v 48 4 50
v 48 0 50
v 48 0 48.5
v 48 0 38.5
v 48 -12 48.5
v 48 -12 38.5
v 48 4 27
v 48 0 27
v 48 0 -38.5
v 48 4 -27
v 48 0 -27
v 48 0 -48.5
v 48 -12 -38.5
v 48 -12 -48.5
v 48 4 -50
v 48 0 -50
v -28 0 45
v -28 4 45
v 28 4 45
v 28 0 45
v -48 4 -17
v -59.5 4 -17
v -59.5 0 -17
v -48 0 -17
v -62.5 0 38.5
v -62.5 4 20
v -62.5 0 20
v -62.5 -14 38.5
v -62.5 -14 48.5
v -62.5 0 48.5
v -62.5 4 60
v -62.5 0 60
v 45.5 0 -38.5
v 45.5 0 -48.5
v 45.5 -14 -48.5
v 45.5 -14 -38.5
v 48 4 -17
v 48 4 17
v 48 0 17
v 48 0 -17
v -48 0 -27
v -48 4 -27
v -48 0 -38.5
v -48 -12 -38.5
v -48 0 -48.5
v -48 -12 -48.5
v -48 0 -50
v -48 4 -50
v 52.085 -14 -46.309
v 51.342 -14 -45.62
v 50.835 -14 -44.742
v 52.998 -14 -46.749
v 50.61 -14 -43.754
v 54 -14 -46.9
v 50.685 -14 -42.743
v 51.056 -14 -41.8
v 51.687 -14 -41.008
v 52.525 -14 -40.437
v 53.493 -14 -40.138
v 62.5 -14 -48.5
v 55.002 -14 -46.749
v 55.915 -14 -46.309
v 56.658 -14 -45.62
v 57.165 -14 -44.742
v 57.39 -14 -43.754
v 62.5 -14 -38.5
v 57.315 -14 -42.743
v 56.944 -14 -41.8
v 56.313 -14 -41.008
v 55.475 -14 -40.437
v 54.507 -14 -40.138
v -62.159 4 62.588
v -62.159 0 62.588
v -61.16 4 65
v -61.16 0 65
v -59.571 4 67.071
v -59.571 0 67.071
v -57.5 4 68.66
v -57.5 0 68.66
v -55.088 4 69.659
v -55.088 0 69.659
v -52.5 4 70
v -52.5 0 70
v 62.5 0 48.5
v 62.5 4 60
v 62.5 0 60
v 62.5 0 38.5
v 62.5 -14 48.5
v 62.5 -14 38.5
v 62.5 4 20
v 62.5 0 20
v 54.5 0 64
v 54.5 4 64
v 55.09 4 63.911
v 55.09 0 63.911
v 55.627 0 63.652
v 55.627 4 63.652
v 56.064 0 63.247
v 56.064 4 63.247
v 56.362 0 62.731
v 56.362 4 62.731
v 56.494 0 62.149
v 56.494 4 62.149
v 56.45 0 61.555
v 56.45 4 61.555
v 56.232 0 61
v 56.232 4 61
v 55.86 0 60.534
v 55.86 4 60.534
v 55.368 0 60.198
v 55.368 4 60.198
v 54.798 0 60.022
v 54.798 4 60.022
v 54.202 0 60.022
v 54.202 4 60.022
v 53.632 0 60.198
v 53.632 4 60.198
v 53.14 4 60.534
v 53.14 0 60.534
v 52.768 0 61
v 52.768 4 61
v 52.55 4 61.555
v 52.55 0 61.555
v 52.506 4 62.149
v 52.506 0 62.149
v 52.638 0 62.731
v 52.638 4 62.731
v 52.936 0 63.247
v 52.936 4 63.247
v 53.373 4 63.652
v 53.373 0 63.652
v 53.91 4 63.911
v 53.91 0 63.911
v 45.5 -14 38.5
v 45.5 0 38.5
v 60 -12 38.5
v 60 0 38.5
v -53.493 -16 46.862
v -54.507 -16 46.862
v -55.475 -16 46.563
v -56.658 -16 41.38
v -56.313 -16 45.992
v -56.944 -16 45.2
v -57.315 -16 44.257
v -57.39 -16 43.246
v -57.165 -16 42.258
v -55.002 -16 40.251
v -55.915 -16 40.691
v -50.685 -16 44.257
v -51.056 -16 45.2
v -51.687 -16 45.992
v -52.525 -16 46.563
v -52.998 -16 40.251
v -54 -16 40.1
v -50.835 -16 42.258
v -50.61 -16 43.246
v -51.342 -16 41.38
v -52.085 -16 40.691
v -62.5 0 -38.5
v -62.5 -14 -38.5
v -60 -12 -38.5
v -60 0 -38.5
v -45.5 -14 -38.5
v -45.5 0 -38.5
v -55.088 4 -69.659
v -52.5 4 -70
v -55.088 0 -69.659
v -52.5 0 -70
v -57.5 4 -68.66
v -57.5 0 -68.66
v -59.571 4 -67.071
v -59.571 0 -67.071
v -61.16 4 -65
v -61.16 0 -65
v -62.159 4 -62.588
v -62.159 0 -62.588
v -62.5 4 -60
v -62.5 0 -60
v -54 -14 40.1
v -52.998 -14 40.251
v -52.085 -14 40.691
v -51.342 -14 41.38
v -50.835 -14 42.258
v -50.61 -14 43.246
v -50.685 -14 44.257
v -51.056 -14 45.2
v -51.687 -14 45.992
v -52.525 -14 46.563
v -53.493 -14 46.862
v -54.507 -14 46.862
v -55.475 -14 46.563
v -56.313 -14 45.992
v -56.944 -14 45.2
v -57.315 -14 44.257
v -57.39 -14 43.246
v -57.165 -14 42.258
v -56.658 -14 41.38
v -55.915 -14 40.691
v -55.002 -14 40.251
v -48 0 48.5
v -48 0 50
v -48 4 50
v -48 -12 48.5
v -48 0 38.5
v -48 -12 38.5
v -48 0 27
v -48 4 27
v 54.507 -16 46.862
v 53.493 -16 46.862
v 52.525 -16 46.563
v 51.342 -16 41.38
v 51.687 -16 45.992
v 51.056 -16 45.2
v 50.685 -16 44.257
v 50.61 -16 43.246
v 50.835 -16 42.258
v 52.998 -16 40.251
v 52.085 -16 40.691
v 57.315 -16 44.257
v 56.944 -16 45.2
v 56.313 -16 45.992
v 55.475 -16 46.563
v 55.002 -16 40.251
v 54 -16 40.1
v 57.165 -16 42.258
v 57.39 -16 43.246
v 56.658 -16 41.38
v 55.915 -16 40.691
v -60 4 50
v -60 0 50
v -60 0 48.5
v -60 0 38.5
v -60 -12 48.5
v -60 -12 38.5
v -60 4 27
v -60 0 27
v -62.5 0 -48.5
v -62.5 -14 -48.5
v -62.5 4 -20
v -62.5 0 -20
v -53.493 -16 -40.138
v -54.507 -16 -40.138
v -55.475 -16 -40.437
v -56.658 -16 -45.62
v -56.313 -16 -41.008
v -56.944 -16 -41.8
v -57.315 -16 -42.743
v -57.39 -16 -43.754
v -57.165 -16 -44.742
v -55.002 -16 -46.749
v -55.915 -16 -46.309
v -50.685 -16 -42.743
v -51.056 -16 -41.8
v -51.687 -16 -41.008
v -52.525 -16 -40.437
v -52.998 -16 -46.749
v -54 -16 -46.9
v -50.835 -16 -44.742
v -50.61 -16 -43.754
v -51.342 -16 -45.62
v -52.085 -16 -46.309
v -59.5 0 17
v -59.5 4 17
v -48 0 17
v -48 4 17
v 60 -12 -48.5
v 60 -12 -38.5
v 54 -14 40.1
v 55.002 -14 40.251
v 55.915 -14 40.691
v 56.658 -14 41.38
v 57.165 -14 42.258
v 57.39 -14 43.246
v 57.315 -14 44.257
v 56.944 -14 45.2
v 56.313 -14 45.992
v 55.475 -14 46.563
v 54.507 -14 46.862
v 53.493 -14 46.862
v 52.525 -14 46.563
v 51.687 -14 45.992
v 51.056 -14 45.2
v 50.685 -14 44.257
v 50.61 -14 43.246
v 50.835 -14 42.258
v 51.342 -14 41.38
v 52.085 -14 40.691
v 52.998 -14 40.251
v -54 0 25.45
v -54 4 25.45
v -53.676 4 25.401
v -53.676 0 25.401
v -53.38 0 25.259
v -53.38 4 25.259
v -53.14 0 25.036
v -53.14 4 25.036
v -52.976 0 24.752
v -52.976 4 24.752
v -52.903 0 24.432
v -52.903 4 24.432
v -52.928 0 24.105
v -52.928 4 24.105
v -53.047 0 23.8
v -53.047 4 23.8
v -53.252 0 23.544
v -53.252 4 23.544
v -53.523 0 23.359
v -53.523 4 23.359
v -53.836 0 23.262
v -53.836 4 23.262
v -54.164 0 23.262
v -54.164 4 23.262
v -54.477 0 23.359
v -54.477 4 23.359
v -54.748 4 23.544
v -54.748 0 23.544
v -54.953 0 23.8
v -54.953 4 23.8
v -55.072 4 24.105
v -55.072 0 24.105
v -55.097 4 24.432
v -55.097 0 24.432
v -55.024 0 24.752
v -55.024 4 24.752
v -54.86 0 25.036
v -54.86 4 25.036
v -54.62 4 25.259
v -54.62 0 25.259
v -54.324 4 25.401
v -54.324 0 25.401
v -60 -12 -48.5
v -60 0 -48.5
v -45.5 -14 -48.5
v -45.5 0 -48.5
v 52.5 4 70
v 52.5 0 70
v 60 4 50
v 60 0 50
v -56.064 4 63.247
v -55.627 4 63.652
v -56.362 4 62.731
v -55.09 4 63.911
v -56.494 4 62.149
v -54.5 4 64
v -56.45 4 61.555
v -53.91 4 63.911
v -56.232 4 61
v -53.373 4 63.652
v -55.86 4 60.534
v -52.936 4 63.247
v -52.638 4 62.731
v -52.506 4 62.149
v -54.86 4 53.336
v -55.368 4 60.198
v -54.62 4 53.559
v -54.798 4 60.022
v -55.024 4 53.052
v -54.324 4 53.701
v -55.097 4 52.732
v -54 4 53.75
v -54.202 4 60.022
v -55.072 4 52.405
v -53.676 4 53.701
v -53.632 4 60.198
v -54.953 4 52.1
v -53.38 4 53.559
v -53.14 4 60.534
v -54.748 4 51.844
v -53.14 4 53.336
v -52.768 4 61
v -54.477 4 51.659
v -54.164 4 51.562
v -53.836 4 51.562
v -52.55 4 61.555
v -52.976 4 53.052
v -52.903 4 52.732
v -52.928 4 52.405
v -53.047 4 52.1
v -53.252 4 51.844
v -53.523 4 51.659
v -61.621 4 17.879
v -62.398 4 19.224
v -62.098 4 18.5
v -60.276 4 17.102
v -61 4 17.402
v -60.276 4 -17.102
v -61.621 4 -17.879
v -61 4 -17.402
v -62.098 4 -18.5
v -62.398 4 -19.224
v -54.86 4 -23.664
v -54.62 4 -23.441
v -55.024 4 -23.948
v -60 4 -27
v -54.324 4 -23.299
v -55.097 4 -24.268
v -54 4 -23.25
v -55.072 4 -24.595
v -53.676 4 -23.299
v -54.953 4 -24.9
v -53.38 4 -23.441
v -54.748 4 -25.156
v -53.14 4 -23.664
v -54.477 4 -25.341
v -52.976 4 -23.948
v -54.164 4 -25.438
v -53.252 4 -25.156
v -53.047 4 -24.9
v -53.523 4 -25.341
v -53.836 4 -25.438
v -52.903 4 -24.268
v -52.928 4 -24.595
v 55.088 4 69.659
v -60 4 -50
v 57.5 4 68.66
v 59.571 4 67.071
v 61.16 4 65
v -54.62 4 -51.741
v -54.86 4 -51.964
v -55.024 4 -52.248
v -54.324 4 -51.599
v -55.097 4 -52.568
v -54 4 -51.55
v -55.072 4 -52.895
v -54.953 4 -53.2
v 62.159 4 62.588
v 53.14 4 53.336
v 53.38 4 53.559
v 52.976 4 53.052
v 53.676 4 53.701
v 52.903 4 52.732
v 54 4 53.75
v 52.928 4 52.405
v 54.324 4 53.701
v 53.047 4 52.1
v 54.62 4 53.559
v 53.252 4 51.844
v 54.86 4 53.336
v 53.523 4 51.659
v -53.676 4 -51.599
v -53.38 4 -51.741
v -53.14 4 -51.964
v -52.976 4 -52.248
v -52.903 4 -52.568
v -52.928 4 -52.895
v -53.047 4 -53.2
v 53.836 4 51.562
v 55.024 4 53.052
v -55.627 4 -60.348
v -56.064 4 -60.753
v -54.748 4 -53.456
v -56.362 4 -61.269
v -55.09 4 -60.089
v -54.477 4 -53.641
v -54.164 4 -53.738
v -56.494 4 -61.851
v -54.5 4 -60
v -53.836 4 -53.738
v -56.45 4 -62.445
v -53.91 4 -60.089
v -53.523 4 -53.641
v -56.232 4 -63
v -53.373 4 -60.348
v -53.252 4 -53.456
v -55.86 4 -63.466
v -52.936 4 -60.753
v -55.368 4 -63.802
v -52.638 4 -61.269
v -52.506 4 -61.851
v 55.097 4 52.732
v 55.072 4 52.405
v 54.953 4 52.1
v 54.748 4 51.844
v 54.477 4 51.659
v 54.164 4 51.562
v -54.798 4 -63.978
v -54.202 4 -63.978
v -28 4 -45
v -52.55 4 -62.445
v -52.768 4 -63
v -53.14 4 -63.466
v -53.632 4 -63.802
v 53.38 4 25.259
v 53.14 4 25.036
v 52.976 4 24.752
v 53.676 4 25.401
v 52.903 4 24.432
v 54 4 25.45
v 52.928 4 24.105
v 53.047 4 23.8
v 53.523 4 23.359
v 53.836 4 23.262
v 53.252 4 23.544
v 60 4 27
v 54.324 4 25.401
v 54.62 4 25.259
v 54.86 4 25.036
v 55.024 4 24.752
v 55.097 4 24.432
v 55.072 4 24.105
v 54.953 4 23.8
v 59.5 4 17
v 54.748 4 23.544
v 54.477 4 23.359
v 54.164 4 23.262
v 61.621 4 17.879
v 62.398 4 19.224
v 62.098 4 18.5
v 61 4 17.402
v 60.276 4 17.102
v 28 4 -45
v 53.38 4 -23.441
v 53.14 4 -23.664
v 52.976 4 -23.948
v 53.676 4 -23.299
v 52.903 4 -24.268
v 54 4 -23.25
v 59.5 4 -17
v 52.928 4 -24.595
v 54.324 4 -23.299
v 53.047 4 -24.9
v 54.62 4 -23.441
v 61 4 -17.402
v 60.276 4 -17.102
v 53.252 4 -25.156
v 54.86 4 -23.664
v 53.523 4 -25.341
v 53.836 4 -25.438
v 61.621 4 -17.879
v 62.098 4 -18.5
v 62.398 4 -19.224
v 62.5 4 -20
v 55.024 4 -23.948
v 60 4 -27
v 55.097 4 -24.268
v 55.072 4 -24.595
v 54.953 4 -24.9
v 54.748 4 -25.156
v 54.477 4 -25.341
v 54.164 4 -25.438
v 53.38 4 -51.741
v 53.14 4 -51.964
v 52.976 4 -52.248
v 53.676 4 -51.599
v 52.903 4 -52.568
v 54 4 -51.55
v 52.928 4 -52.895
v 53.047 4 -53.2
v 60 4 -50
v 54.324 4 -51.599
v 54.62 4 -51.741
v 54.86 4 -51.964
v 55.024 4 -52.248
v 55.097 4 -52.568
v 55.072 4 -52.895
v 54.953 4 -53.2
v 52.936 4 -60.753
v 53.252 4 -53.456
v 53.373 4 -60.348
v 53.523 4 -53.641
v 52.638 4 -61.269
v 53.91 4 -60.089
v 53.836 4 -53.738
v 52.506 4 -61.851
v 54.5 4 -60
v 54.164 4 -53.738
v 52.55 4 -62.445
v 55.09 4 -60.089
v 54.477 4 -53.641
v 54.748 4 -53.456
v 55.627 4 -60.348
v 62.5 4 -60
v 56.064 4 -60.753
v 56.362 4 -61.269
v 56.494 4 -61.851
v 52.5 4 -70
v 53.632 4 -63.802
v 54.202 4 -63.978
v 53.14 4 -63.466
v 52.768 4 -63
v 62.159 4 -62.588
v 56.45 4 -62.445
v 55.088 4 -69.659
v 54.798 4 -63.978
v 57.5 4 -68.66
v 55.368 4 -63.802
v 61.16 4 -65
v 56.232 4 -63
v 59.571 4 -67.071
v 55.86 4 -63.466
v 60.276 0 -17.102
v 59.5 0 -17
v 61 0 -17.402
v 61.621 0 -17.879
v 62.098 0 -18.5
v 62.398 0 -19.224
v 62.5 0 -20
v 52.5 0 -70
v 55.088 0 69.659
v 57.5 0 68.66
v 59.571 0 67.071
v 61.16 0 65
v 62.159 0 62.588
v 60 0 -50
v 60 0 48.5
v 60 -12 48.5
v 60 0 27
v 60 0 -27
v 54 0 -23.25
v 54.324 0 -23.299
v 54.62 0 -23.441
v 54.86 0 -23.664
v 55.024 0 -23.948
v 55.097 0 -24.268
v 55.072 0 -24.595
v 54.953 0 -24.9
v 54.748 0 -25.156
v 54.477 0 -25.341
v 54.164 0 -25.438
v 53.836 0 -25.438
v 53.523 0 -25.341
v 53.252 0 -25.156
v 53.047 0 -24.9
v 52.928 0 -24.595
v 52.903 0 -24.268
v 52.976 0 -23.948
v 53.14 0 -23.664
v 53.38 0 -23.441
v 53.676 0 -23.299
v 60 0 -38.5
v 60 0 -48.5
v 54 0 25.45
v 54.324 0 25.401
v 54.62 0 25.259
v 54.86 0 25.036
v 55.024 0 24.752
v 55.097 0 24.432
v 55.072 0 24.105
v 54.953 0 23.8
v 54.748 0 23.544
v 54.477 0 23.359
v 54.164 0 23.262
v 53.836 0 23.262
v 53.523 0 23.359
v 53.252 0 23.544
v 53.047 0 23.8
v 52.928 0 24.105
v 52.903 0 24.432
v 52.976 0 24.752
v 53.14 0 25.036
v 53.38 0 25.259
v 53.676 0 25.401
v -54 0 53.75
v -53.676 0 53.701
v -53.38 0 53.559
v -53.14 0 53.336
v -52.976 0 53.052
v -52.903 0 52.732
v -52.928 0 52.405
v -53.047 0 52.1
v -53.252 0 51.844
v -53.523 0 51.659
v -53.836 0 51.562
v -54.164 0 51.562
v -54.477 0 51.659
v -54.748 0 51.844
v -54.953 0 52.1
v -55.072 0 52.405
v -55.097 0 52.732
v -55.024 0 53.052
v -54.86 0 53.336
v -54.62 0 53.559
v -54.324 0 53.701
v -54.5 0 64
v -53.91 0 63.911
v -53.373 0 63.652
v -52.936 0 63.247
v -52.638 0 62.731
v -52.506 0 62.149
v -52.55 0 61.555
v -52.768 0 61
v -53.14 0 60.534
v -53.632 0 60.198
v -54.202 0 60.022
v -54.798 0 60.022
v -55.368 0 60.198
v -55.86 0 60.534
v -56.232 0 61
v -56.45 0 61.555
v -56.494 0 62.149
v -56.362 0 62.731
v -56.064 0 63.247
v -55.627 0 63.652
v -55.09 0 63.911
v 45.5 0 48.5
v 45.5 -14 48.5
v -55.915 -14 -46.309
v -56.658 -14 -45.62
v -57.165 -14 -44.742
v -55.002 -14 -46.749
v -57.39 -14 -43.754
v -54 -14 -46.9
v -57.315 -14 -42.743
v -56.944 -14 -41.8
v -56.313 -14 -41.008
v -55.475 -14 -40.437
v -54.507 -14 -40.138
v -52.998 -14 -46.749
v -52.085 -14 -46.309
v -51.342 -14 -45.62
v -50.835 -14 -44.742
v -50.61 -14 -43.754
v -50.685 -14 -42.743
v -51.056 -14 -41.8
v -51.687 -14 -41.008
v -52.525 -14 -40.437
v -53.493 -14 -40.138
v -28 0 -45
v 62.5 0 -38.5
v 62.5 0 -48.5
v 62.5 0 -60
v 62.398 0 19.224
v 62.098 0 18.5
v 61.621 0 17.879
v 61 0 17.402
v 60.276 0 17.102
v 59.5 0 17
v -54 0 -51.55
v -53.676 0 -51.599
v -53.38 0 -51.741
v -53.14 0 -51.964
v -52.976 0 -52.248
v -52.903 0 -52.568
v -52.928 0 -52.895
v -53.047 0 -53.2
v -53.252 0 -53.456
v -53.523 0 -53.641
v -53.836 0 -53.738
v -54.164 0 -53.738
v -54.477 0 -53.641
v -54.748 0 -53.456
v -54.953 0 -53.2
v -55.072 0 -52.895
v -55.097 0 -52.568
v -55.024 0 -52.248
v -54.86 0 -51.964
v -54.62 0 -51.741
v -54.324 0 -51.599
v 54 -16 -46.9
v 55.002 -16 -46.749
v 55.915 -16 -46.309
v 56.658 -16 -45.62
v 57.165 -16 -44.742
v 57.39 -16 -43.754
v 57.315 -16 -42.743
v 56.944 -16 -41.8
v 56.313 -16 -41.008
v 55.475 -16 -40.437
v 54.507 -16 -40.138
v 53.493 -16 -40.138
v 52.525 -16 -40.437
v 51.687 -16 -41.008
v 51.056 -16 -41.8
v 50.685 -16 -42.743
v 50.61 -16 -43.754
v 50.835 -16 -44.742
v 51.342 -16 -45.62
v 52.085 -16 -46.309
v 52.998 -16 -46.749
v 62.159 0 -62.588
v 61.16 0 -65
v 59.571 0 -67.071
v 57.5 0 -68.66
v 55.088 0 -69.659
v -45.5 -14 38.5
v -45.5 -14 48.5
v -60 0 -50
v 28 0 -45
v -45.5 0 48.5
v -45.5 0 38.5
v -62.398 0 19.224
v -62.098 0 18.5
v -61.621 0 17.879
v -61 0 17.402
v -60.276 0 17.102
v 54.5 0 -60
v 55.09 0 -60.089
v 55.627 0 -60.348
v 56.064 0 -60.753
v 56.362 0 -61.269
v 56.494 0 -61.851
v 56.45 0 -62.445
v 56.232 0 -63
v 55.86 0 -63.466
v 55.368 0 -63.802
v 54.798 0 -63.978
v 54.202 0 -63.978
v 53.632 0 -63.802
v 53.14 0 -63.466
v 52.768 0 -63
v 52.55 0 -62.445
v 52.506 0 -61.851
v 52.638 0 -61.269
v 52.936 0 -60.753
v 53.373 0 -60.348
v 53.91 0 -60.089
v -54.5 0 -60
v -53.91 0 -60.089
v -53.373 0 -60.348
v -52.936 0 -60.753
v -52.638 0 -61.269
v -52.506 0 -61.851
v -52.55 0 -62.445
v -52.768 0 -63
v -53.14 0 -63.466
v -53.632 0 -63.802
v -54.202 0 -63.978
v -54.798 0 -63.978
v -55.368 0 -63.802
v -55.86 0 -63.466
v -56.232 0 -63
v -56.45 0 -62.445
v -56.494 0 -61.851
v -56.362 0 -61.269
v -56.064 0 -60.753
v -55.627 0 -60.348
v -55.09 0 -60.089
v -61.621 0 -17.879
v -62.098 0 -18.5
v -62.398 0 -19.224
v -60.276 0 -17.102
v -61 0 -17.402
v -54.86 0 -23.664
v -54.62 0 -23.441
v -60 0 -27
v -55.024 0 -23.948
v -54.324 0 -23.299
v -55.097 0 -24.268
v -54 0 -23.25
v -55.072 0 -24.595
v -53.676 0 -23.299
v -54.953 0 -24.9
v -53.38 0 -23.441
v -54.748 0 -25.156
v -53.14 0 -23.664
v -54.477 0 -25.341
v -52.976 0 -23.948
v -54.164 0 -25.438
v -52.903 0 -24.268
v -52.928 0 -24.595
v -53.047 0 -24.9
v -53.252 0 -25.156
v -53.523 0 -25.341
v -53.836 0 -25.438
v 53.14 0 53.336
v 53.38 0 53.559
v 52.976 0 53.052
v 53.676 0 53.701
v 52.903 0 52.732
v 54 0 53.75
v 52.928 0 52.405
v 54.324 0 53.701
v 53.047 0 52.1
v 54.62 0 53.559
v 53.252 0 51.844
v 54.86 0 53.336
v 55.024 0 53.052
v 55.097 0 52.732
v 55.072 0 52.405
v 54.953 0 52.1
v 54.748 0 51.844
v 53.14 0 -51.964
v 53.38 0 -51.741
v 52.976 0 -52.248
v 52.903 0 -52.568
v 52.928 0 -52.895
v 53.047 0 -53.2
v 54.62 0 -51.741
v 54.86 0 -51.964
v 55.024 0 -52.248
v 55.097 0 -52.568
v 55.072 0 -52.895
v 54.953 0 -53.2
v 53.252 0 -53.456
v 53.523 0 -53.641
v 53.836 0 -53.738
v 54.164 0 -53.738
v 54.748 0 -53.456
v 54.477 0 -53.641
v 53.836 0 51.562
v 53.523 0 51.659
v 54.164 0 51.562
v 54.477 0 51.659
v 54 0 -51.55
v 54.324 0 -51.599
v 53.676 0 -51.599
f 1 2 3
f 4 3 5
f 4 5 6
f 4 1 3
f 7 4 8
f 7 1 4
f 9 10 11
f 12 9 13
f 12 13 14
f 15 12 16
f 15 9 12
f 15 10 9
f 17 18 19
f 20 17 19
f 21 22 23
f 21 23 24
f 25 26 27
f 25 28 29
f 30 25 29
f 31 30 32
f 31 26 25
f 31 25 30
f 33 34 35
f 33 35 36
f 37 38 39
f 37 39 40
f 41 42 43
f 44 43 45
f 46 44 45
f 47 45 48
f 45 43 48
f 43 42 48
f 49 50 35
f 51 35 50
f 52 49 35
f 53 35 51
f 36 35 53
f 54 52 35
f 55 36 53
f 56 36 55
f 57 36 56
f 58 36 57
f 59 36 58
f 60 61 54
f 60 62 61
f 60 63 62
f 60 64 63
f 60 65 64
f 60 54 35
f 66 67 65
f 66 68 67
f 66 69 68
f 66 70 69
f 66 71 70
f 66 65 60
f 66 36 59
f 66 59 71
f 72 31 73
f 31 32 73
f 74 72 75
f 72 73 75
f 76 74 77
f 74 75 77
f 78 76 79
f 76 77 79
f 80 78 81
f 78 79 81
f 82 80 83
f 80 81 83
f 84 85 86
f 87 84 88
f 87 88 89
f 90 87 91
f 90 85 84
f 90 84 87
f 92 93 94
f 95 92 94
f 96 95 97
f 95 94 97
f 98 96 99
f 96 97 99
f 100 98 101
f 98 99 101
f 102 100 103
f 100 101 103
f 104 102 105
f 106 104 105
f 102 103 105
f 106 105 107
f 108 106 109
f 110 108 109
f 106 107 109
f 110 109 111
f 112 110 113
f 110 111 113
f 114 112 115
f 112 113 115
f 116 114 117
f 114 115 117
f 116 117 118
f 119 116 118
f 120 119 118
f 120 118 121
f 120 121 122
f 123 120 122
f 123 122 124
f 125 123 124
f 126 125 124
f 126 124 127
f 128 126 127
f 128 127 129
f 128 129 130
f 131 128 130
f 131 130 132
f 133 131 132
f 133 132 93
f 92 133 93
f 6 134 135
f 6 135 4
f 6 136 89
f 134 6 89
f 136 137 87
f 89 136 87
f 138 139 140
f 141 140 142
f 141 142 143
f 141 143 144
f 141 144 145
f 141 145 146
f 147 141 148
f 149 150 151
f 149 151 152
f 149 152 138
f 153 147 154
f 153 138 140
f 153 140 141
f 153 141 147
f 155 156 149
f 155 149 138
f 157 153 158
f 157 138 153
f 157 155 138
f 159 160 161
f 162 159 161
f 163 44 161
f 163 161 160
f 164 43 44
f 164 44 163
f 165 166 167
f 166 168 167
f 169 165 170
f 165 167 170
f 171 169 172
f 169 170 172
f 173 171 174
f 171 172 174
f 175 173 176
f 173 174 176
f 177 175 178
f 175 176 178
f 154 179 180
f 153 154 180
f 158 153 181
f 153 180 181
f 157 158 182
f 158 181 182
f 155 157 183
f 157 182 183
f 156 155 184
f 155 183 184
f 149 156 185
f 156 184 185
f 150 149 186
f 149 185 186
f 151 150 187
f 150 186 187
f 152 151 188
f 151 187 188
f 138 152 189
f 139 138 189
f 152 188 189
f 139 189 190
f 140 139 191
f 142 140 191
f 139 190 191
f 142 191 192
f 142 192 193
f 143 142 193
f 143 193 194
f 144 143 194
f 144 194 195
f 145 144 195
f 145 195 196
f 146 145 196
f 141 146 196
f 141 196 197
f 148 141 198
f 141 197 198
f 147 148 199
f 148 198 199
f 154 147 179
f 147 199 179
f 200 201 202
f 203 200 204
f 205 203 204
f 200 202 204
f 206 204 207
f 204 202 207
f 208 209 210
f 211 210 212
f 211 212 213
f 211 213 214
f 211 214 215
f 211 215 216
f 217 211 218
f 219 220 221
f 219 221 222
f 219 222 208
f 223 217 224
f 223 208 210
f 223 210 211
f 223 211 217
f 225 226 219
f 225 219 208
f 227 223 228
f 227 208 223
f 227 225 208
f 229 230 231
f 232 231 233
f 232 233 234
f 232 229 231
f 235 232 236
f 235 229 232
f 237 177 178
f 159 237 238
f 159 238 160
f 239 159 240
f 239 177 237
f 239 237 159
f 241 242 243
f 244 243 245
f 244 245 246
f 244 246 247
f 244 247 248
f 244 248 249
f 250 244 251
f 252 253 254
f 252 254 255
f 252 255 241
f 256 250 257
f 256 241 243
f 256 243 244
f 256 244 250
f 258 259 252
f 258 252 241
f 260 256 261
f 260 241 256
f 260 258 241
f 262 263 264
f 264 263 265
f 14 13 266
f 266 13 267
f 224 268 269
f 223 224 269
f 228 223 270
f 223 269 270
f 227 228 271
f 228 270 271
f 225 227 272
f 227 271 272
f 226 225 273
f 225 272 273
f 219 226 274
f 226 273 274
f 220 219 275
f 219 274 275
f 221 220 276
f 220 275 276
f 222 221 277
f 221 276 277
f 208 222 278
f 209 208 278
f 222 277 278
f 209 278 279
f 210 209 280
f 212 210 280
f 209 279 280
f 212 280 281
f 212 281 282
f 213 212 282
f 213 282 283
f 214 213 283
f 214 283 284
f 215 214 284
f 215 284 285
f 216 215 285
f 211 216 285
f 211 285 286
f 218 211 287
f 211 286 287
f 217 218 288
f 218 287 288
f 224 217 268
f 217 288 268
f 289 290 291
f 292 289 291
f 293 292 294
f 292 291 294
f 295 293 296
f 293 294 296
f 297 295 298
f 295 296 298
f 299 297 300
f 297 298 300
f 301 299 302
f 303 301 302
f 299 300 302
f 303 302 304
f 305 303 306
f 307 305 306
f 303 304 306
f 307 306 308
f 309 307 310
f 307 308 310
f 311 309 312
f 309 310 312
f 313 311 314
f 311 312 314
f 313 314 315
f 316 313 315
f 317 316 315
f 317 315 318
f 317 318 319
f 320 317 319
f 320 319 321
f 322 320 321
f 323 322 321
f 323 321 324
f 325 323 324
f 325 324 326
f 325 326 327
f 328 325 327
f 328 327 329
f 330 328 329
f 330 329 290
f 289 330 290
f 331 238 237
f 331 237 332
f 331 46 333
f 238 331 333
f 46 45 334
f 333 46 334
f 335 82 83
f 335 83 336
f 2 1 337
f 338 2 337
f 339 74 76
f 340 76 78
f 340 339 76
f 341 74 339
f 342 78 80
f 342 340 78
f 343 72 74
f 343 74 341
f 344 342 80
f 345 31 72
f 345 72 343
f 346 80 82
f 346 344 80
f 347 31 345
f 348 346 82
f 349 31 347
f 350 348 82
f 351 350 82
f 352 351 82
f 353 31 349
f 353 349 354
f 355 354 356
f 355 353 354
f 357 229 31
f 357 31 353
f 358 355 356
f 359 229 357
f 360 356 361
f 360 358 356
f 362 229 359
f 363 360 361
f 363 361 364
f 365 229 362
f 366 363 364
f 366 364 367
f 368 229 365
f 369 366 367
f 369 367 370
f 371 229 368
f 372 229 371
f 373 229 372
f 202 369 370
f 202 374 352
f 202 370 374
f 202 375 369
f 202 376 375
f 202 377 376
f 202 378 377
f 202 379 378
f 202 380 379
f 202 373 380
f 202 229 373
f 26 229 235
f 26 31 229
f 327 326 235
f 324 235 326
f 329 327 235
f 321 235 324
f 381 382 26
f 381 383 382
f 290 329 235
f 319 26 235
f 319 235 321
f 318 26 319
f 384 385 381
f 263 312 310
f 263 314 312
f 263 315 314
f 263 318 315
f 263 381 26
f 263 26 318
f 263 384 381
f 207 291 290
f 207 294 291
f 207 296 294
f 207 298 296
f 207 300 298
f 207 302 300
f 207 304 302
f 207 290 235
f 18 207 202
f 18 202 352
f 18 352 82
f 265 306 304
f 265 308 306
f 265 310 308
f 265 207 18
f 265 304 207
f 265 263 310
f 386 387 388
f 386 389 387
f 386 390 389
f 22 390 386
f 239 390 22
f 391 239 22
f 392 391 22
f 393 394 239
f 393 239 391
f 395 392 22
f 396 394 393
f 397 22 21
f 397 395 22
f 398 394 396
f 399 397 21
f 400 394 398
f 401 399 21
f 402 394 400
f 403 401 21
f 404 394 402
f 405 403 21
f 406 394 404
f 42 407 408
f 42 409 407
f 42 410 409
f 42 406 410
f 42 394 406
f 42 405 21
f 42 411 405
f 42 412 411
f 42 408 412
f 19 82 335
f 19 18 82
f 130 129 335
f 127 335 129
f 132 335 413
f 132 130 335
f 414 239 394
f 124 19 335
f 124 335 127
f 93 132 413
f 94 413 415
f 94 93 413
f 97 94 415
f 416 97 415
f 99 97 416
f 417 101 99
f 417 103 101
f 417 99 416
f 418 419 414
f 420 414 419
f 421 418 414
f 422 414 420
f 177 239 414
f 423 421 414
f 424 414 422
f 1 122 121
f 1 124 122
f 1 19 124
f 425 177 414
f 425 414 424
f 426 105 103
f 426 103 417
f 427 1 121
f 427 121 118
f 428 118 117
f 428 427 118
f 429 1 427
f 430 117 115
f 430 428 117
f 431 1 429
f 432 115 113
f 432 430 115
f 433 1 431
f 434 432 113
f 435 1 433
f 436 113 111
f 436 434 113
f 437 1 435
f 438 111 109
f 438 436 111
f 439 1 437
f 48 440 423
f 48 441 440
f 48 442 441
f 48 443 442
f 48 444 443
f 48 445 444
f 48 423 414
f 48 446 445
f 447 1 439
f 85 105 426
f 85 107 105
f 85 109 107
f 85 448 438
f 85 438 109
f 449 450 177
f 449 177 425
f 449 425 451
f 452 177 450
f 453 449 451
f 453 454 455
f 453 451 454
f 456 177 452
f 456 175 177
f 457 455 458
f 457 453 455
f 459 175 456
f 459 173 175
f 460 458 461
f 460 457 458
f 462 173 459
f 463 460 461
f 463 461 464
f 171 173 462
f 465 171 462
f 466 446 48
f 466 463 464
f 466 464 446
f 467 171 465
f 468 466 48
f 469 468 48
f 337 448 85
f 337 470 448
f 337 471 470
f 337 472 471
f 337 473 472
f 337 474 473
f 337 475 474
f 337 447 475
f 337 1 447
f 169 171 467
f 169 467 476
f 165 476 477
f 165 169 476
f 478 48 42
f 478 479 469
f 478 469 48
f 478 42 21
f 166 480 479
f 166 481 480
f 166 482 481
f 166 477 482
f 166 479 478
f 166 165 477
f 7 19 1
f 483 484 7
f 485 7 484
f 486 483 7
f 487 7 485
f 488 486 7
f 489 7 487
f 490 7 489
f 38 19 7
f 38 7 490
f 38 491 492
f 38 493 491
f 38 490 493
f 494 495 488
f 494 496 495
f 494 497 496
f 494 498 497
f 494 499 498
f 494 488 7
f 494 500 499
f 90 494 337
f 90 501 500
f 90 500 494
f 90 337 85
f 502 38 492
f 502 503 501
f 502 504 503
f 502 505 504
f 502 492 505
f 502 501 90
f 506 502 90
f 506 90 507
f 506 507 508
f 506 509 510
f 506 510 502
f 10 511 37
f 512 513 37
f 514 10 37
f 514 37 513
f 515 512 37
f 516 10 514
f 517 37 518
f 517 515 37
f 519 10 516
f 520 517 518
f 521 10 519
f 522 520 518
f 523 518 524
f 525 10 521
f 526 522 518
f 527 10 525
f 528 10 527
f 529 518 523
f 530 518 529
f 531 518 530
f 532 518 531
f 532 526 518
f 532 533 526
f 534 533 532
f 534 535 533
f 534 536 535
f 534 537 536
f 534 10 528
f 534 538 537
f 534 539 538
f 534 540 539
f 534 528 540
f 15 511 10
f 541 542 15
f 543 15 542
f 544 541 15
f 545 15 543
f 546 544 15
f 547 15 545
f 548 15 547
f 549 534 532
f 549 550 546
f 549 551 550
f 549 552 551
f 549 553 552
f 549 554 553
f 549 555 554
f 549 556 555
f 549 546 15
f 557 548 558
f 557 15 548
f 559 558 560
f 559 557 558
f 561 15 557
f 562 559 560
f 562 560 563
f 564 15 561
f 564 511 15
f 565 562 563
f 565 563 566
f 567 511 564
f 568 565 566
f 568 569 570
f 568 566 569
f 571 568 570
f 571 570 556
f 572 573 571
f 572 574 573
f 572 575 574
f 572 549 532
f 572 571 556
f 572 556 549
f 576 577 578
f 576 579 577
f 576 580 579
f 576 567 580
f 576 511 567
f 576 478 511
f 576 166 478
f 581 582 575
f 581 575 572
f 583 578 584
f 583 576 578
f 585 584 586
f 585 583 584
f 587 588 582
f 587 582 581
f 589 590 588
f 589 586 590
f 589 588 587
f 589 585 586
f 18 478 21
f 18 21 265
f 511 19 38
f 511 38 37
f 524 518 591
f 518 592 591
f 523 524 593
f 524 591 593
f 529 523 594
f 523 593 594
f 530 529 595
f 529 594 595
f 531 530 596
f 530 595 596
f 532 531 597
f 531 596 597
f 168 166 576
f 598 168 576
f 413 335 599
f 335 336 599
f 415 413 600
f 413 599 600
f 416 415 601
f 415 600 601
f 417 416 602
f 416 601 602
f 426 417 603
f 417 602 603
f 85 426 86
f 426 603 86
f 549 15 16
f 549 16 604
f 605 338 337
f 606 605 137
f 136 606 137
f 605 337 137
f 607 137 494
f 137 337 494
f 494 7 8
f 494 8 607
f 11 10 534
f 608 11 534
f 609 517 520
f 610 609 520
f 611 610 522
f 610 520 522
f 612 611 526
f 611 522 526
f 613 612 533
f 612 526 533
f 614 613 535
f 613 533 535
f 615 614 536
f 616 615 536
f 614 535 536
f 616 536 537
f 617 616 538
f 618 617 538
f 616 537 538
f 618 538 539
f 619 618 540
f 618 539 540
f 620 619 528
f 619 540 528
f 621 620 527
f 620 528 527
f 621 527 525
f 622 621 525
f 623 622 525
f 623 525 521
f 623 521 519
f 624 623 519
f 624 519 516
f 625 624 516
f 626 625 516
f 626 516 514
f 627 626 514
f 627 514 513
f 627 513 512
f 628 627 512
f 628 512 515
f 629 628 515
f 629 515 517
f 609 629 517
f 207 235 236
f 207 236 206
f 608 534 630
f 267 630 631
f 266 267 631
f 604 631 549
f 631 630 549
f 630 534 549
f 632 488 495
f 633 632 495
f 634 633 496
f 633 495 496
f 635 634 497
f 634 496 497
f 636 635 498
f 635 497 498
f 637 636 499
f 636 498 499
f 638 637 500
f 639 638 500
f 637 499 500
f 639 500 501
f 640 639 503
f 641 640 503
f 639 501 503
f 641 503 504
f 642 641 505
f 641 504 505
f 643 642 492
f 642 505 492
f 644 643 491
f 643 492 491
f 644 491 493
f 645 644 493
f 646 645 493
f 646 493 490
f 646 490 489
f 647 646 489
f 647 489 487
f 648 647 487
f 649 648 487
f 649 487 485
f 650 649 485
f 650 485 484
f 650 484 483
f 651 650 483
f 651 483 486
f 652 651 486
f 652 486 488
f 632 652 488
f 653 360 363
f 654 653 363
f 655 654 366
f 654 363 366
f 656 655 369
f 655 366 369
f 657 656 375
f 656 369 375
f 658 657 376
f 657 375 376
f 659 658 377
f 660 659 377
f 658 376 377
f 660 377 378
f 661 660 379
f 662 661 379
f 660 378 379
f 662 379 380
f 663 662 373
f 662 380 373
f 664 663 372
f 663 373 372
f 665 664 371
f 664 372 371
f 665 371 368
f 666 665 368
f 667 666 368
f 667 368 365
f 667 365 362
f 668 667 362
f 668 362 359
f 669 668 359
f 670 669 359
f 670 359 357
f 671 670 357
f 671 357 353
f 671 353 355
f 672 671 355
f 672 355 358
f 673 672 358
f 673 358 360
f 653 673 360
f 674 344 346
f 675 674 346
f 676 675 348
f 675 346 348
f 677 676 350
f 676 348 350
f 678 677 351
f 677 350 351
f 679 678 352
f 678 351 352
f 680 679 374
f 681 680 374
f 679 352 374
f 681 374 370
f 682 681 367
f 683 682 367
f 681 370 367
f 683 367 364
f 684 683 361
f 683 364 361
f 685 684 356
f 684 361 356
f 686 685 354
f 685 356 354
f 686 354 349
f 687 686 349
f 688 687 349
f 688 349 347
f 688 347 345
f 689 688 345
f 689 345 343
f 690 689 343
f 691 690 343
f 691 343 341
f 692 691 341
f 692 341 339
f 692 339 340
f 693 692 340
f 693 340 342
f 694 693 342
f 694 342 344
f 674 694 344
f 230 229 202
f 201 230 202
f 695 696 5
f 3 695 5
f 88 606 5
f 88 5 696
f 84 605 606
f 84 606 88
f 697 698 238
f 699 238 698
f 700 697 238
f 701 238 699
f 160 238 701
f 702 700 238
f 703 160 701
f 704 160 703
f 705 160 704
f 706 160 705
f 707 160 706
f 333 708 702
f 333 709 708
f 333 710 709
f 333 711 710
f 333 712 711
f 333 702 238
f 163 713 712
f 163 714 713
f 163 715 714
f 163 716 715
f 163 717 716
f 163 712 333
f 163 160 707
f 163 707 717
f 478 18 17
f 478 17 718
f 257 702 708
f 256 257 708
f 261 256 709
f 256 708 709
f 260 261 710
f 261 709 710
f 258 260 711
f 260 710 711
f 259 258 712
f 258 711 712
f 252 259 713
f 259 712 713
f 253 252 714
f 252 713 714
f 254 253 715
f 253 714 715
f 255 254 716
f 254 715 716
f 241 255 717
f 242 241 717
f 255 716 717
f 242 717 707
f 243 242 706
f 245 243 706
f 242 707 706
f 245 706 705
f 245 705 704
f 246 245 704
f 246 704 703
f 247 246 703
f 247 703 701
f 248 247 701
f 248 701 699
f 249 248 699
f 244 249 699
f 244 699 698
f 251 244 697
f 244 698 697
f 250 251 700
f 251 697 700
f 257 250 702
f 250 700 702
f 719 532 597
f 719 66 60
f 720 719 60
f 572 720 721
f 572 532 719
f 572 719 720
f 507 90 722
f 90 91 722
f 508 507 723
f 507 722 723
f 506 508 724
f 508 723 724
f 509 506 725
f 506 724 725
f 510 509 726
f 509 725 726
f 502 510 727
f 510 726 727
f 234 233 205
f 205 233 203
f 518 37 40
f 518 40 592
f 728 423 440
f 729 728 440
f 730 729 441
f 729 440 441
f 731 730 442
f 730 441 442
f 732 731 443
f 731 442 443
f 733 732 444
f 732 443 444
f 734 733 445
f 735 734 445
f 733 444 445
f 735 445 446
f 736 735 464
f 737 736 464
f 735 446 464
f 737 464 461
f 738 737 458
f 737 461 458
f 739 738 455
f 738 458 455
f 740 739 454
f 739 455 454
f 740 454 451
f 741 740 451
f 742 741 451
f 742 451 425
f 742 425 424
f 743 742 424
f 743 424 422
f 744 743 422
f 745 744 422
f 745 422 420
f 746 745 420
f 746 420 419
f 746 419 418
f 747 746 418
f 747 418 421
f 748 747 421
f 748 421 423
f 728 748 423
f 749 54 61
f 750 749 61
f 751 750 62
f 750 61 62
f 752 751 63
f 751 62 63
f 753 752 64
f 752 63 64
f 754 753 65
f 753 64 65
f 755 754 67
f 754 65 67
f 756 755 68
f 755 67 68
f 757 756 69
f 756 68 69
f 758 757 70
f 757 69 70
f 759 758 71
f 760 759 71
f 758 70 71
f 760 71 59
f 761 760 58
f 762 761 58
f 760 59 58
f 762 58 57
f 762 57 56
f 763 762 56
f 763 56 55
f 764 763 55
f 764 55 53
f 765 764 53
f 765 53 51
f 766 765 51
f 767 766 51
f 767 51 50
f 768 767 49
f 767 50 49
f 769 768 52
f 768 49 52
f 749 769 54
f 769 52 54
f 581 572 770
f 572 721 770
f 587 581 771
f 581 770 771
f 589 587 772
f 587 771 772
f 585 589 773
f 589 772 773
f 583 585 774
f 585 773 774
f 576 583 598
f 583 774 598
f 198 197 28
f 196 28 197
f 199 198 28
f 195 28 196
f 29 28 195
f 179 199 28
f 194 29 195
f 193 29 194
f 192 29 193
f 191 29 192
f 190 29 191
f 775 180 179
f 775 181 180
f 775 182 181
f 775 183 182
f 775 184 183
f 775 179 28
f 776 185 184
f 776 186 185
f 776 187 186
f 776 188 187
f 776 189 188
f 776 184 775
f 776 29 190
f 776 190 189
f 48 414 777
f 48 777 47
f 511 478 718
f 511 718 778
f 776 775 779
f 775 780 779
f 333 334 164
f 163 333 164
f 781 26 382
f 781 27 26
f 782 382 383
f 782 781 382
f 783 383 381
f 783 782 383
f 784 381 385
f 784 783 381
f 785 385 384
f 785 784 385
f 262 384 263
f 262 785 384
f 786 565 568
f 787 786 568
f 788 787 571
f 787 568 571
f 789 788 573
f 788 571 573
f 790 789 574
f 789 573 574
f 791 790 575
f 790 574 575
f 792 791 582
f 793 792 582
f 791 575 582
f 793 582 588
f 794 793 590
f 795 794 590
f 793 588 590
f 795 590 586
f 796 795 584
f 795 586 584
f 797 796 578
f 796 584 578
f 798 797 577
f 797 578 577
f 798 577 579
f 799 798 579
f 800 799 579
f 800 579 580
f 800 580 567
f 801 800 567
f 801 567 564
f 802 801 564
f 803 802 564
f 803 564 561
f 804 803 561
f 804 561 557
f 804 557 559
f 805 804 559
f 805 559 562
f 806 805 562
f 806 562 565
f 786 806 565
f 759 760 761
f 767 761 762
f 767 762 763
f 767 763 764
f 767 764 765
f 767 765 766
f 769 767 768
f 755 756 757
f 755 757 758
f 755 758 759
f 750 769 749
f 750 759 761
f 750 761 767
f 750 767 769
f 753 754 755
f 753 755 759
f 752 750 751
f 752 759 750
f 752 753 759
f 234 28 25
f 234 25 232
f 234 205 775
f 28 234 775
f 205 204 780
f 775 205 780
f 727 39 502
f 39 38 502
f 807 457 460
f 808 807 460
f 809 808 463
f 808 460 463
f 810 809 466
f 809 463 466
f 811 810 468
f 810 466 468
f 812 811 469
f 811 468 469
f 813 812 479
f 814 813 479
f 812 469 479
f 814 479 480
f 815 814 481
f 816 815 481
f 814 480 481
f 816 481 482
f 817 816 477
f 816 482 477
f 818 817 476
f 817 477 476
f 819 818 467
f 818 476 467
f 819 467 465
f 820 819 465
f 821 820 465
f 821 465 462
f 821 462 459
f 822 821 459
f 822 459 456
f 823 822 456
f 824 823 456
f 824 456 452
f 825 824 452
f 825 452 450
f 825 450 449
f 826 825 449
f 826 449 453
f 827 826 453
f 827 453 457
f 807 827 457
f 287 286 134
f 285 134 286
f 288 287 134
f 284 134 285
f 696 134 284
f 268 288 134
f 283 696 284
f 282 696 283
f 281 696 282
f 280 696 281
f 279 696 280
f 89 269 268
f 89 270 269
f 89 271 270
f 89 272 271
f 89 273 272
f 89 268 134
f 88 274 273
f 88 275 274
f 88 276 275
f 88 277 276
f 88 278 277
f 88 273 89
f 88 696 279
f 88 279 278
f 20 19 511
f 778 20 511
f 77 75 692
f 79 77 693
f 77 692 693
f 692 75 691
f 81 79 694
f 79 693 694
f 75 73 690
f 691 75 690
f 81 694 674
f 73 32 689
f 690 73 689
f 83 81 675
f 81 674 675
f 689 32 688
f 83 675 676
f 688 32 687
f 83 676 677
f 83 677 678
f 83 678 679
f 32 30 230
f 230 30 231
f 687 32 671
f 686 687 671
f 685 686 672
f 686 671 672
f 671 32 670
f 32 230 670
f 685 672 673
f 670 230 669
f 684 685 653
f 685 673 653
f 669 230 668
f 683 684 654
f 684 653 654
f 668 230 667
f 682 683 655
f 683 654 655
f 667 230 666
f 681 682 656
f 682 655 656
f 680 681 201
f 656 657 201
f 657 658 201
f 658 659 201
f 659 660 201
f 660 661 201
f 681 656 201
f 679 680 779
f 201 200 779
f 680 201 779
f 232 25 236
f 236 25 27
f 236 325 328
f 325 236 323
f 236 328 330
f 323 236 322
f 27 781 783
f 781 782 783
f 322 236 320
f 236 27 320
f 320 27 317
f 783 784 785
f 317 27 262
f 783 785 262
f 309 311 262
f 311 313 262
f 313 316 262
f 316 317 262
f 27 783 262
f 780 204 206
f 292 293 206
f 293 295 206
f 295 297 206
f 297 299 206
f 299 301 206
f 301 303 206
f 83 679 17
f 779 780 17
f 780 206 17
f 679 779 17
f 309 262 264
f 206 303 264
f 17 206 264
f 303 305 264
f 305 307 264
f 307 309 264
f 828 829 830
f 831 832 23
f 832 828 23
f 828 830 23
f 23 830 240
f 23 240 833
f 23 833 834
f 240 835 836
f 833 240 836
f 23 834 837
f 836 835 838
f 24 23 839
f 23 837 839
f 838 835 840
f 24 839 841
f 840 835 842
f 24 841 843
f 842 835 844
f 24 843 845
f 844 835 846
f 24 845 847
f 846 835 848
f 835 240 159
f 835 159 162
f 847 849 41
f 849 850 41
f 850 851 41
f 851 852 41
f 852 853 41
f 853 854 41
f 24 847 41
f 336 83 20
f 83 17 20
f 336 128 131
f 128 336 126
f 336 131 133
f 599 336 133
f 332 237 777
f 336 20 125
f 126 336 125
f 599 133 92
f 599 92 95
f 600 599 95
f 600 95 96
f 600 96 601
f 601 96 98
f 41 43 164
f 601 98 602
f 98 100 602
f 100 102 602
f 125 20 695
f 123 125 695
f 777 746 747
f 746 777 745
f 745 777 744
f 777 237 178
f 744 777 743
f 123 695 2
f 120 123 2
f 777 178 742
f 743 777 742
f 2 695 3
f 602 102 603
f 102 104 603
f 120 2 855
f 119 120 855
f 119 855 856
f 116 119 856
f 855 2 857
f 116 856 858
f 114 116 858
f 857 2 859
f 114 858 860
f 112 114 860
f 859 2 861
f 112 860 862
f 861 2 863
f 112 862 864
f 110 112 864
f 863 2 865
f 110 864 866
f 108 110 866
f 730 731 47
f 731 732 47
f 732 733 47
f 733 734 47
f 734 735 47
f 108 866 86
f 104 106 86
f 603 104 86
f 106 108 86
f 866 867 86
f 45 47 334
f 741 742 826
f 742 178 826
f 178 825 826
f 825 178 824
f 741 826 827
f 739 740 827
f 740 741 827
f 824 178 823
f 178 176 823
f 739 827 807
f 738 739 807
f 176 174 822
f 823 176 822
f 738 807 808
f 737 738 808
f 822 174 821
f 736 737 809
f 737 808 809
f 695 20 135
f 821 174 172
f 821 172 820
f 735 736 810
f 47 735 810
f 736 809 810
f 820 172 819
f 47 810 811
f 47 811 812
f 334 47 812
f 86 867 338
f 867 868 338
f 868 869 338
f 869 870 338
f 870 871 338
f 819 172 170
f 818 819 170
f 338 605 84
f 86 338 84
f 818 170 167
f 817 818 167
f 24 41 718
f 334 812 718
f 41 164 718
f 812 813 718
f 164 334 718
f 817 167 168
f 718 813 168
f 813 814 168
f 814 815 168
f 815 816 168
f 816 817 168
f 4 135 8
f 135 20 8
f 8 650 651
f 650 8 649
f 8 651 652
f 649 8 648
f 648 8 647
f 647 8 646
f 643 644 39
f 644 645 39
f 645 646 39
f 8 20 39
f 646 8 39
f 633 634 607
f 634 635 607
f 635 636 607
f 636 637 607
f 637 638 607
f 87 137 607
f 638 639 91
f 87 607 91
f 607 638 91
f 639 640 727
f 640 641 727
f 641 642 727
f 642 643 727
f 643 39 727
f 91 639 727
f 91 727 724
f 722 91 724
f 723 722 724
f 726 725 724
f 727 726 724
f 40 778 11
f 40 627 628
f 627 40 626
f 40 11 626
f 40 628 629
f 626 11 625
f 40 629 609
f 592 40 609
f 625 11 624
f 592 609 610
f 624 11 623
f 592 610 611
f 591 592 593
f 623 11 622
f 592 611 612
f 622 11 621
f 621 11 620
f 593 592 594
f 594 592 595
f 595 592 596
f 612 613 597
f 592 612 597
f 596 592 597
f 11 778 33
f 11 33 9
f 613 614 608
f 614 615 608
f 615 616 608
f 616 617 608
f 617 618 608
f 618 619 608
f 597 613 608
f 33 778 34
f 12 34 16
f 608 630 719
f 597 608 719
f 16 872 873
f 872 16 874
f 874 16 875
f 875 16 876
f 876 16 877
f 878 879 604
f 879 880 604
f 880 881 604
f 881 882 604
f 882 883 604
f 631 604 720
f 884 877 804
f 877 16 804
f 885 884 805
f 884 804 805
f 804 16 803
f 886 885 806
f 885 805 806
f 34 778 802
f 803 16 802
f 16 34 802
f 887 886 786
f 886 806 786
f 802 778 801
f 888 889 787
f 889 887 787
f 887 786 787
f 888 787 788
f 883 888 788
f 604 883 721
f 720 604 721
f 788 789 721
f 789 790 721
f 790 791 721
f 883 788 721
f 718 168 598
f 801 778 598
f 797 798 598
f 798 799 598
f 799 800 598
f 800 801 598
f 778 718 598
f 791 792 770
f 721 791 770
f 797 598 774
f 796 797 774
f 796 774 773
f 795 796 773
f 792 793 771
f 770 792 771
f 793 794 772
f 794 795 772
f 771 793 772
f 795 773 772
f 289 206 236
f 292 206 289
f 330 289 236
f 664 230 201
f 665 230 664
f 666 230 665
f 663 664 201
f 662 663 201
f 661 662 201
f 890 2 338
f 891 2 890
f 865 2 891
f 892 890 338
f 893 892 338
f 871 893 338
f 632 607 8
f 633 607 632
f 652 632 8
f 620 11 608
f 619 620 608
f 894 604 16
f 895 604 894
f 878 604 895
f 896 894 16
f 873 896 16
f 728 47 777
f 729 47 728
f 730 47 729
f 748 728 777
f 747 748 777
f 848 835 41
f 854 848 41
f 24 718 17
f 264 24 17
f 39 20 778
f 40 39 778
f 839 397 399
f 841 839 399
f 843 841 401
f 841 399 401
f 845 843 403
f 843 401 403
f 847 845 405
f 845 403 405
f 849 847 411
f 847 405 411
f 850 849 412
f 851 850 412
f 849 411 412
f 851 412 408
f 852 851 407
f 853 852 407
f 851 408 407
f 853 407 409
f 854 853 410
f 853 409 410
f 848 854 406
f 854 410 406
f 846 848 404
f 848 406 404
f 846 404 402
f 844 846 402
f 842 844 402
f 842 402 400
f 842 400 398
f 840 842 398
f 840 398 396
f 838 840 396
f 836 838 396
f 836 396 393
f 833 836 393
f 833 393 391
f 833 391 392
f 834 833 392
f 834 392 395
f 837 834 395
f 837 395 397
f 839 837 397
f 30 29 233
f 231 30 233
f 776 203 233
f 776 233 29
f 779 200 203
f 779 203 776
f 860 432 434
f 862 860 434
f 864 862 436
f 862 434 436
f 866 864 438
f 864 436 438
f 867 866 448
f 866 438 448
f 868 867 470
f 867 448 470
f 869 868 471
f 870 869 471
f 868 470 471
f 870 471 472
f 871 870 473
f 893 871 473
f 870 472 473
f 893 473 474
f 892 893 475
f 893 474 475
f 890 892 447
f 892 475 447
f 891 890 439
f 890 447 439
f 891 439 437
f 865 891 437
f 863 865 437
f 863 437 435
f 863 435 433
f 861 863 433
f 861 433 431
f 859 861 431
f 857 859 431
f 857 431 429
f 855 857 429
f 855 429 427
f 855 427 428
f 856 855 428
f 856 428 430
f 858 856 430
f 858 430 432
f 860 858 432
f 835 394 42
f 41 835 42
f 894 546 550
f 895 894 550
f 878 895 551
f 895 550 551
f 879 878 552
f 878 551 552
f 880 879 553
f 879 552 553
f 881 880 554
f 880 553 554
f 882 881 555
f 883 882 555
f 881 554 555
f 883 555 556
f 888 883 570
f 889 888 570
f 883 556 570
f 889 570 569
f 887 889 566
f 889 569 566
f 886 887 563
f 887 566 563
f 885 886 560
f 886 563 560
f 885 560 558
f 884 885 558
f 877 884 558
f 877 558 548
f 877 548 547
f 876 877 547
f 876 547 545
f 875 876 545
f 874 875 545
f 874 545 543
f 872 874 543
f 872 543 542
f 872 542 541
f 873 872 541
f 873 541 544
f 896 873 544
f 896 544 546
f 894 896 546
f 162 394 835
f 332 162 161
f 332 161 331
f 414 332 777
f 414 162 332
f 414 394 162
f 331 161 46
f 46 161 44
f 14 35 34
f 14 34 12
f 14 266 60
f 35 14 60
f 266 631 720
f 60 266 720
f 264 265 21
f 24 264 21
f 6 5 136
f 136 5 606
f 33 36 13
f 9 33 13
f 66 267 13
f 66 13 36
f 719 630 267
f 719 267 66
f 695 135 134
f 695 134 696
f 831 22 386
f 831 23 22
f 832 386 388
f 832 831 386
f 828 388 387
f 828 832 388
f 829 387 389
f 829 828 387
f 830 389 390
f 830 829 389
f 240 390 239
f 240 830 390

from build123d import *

# Parameters (mm, degrees)
SKETCH1_W           = 120
SKETCH1_H           = 140
BOSS_EXTRUDE1_DEPTH = 4
SKETCH2_W           = 12
SKETCH2_H           = 23
SKETCH2_H_2         = 34
SKETCH2_R           = 1.1
SKETCH2_R_2         = 2
CUT_EXTRUDE1_DEPTH  = 93.28217596
SKETCH3_W           = 2.5
SKETCH3_H           = 140
BOSS_EXTRUDE2_DEPTH = 4
SKETCH7_W           = 2.5
SKETCH7_H           = 10
BOSS_EXTRUDE6_DEPTH = 12
SKETCH8_W           = 17
SKETCH8_H           = 10
BOSS_EXTRUDE7_DEPTH = 2
SKETCH9_R           = 3.4
BOSS_EXTRUDE8_DEPTH = 2
SKETCH10_W          = 2.5
SKETCH10_H          = 34
CUT_EXTRUDE2_DEPTH  = 96.949205312
FILLET1_R           = 10
FILLET2_R           = 10
FILLET3_R           = 10
FILLET4_R           = 10
FILLET5_R           = 3
FILLET6_R           = 3
FILLET7_R           = 3
FILLET8_R           = 3
SKETCH11_W          = 56
SKETCH11_H          = 90
CUT_EXTRUDE3_DEPTH  = 96.949205312


with BuildPart() as part:
    # Sketch1 → Boss-Extrude1 (new body)
    with BuildSketch(Plane(origin=(0, 0, 0), x_dir=(1, 0, 0), z_dir=(0, 1, 0))):
        Rectangle(SKETCH1_W, SKETCH1_H)
    extrude(amount=BOSS_EXTRUDE1_DEPTH)

    # Sketch2 → Cut-Extrude1 (cut, through all)
    with BuildSketch(Plane(origin=(0, 4, 0), x_dir=(1, 0, 0), z_dir=(0, 1, 0))):
        with Locations((54, 38.5)):
            Rectangle(SKETCH2_W, SKETCH2_H)
        with Locations((-54, 38.5)):
            Rectangle(SKETCH2_W, SKETCH2_H)
        with Locations((54, -38.5)):
            Rectangle(SKETCH2_W, SKETCH2_H)
        with Locations((-54, -38.5)):
            Rectangle(SKETCH2_W, SKETCH2_H)
        with Locations((-54, 0)):
            Rectangle(SKETCH2_W, SKETCH2_H_2)
        with Locations((54, 0)):
            Rectangle(SKETCH2_W, SKETCH2_H_2)
        with Locations(Location((-54, 52.65, 0), (0, 0, 270))):
            Circle(SKETCH2_R)
        with Locations(Location((-54, 24.35, 0), (0, 0, 270))):
            Circle(SKETCH2_R)
        with Locations(Location((-54, -24.35, 0), (0, 0, 270))):
            Circle(SKETCH2_R)
        with Locations(Location((-54, -52.65, 0), (0, 0, 270))):
            Circle(SKETCH2_R)
        with Locations(Location((54, 52.65, 0), (0, 0, 270))):
            Circle(SKETCH2_R)
        with Locations(Location((54, 24.35, 0), (0, 0, 270))):
            Circle(SKETCH2_R)
        with Locations(Location((54, -24.35, 0), (0, 0, 270))):
            Circle(SKETCH2_R)
        with Locations(Location((54, -52.65, 0), (0, 0, 270))):
            Circle(SKETCH2_R)
        with Locations(Location((-54.5, 62, 0), (0, 0, 270))):
            Circle(SKETCH2_R_2)
        with Locations(Location((54.5, 62, 0), (0, 0, 270))):
            Circle(SKETCH2_R_2)
        with Locations(Location((54.5, -62, 0), (0, 0, 270))):
            Circle(SKETCH2_R_2)
        with Locations(Location((-54.5, -62, 0), (0, 0, 270))):
            Circle(SKETCH2_R_2)
    extrude(amount=-CUT_EXTRUDE1_DEPTH, mode=Mode.SUBTRACT)

    # Sketch3 → Boss-Extrude2 (add)
    with BuildSketch(Plane(origin=(0, 4, 0), x_dir=(1, 0, 0), z_dir=(0, 1, 0))):
        with Locations((61.25, 0)):
            Rectangle(SKETCH3_W, SKETCH3_H)
        with Locations((-61.25, 0)):
            Rectangle(SKETCH3_W, SKETCH3_H)
    extrude(amount=-BOSS_EXTRUDE2_DEPTH)

    # Sketch7 → Boss-Extrude6 (add)
    with BuildSketch(Plane.XZ):
        with Locations((46.75, 43.5)):
            Rectangle(SKETCH7_W, SKETCH7_H)
        with Locations((61.25, 43.5)):
            Rectangle(SKETCH7_W, SKETCH7_H)
        with Locations((-61.25, 43.5)):
            Rectangle(SKETCH7_W, SKETCH7_H)
        with Locations((-46.75, 43.5)):
            Rectangle(SKETCH7_W, SKETCH7_H)
        with Locations((-61.25, -43.5)):
            Rectangle(SKETCH7_W, SKETCH7_H)
        with Locations((-46.75, -43.5)):
            Rectangle(SKETCH7_W, SKETCH7_H)
        with Locations((46.75, -43.5)):
            Rectangle(SKETCH7_W, SKETCH7_H)
        with Locations((61.25, -43.5)):
            Rectangle(SKETCH7_W, SKETCH7_H)
    extrude(amount=BOSS_EXTRUDE6_DEPTH)

    # Sketch8 → Boss-Extrude7 (add)
    with BuildSketch(Plane.XZ.offset(12)):
        with Locations((-54, 43.5)):
            Rectangle(SKETCH8_W, SKETCH8_H)
        with Locations((-54, -43.5)):
            Rectangle(SKETCH8_W, SKETCH8_H)
        with Locations((54, -43.5)):
            Rectangle(SKETCH8_W, SKETCH8_H)
        with Locations((54, 43.5)):
            Rectangle(SKETCH8_W, SKETCH8_H)
    extrude(amount=BOSS_EXTRUDE7_DEPTH)

    # Sketch9 → Boss-Extrude8 (add)
    with BuildSketch(Plane.XZ.offset(14)):
        with Locations(Location((54, 43.5, 0), (0, 0, 270))):
            Circle(SKETCH9_R)
        with Locations(Location((-54, 43.5, 0), (0, 0, 270))):
            Circle(SKETCH9_R)
        with Locations(Location((-54, -43.5, 0), (0, 0, 270))):
            Circle(SKETCH9_R)
        with Locations(Location((54, -43.5, 0), (0, 0, 270))):
            Circle(SKETCH9_R)
    extrude(amount=BOSS_EXTRUDE8_DEPTH)

    # Sketch10 → Cut-Extrude2 (cut, through all)
    with BuildSketch(Plane(origin=(0, 4, 0), x_dir=(1, 0, 0), z_dir=(0, 1, 0))):
        with Locations((61.25, 0)):
            Rectangle(SKETCH10_W, SKETCH10_H)
        with Locations((-61.25, 0)):
            Rectangle(SKETCH10_W, SKETCH10_H)
    extrude(amount=-CUT_EXTRUDE2_DEPTH, mode=Mode.SUBTRACT)

    # Fillet1
    fillet1_edges = [part.edges().sort_by_distance(p)[0] for p in [
        (62.5, 2, -70),
    ]]
    fillet(fillet1_edges, radius=FILLET1_R)

    # Fillet2
    fillet2_edges = [part.edges().sort_by_distance(p)[0] for p in [
        (-62.5, 2, -70),
    ]]
    fillet(fillet2_edges, radius=FILLET2_R)

    # Fillet3
    fillet3_edges = [part.edges().sort_by_distance(p)[0] for p in [
        (-62.5, 2, 70),
    ]]
    fillet(fillet3_edges, radius=FILLET3_R)

    # Fillet4
    fillet4_edges = [part.edges().sort_by_distance(p)[0] for p in [
        (62.5, 2, 70),
    ]]
    fillet(fillet4_edges, radius=FILLET4_R)

    # Fillet5
    fillet5_edges = [part.edges().sort_by_distance(p)[0] for p in [
        (62.5, 2, -17),
    ]]
    fillet(fillet5_edges, radius=FILLET5_R)

    # Fillet6
    fillet6_edges = [part.edges().sort_by_distance(p)[0] for p in [
        (-62.5, 2, 17),
    ]]
    fillet(fillet6_edges, radius=FILLET6_R)

    # Fillet7
    fillet7_edges = [part.edges().sort_by_distance(p)[0] for p in [
        (62.5, 2, 17),
    ]]
    fillet(fillet7_edges, radius=FILLET7_R)

    # Fillet8
    fillet8_edges = [part.edges().sort_by_distance(p)[0] for p in [
        (-62.5, 2, -17),
    ]]
    fillet(fillet8_edges, radius=FILLET8_R)

    # Sketch11 → Cut-Extrude3 (cut, through all)
    with BuildSketch(Plane(origin=(0, 4, 0), x_dir=(1, 0, 0), z_dir=(0, 1, 0))):
        Rectangle(SKETCH11_W, SKETCH11_H)
    extrude(amount=-CUT_EXTRUDE3_DEPTH, mode=Mode.SUBTRACT)


solid = part.part
